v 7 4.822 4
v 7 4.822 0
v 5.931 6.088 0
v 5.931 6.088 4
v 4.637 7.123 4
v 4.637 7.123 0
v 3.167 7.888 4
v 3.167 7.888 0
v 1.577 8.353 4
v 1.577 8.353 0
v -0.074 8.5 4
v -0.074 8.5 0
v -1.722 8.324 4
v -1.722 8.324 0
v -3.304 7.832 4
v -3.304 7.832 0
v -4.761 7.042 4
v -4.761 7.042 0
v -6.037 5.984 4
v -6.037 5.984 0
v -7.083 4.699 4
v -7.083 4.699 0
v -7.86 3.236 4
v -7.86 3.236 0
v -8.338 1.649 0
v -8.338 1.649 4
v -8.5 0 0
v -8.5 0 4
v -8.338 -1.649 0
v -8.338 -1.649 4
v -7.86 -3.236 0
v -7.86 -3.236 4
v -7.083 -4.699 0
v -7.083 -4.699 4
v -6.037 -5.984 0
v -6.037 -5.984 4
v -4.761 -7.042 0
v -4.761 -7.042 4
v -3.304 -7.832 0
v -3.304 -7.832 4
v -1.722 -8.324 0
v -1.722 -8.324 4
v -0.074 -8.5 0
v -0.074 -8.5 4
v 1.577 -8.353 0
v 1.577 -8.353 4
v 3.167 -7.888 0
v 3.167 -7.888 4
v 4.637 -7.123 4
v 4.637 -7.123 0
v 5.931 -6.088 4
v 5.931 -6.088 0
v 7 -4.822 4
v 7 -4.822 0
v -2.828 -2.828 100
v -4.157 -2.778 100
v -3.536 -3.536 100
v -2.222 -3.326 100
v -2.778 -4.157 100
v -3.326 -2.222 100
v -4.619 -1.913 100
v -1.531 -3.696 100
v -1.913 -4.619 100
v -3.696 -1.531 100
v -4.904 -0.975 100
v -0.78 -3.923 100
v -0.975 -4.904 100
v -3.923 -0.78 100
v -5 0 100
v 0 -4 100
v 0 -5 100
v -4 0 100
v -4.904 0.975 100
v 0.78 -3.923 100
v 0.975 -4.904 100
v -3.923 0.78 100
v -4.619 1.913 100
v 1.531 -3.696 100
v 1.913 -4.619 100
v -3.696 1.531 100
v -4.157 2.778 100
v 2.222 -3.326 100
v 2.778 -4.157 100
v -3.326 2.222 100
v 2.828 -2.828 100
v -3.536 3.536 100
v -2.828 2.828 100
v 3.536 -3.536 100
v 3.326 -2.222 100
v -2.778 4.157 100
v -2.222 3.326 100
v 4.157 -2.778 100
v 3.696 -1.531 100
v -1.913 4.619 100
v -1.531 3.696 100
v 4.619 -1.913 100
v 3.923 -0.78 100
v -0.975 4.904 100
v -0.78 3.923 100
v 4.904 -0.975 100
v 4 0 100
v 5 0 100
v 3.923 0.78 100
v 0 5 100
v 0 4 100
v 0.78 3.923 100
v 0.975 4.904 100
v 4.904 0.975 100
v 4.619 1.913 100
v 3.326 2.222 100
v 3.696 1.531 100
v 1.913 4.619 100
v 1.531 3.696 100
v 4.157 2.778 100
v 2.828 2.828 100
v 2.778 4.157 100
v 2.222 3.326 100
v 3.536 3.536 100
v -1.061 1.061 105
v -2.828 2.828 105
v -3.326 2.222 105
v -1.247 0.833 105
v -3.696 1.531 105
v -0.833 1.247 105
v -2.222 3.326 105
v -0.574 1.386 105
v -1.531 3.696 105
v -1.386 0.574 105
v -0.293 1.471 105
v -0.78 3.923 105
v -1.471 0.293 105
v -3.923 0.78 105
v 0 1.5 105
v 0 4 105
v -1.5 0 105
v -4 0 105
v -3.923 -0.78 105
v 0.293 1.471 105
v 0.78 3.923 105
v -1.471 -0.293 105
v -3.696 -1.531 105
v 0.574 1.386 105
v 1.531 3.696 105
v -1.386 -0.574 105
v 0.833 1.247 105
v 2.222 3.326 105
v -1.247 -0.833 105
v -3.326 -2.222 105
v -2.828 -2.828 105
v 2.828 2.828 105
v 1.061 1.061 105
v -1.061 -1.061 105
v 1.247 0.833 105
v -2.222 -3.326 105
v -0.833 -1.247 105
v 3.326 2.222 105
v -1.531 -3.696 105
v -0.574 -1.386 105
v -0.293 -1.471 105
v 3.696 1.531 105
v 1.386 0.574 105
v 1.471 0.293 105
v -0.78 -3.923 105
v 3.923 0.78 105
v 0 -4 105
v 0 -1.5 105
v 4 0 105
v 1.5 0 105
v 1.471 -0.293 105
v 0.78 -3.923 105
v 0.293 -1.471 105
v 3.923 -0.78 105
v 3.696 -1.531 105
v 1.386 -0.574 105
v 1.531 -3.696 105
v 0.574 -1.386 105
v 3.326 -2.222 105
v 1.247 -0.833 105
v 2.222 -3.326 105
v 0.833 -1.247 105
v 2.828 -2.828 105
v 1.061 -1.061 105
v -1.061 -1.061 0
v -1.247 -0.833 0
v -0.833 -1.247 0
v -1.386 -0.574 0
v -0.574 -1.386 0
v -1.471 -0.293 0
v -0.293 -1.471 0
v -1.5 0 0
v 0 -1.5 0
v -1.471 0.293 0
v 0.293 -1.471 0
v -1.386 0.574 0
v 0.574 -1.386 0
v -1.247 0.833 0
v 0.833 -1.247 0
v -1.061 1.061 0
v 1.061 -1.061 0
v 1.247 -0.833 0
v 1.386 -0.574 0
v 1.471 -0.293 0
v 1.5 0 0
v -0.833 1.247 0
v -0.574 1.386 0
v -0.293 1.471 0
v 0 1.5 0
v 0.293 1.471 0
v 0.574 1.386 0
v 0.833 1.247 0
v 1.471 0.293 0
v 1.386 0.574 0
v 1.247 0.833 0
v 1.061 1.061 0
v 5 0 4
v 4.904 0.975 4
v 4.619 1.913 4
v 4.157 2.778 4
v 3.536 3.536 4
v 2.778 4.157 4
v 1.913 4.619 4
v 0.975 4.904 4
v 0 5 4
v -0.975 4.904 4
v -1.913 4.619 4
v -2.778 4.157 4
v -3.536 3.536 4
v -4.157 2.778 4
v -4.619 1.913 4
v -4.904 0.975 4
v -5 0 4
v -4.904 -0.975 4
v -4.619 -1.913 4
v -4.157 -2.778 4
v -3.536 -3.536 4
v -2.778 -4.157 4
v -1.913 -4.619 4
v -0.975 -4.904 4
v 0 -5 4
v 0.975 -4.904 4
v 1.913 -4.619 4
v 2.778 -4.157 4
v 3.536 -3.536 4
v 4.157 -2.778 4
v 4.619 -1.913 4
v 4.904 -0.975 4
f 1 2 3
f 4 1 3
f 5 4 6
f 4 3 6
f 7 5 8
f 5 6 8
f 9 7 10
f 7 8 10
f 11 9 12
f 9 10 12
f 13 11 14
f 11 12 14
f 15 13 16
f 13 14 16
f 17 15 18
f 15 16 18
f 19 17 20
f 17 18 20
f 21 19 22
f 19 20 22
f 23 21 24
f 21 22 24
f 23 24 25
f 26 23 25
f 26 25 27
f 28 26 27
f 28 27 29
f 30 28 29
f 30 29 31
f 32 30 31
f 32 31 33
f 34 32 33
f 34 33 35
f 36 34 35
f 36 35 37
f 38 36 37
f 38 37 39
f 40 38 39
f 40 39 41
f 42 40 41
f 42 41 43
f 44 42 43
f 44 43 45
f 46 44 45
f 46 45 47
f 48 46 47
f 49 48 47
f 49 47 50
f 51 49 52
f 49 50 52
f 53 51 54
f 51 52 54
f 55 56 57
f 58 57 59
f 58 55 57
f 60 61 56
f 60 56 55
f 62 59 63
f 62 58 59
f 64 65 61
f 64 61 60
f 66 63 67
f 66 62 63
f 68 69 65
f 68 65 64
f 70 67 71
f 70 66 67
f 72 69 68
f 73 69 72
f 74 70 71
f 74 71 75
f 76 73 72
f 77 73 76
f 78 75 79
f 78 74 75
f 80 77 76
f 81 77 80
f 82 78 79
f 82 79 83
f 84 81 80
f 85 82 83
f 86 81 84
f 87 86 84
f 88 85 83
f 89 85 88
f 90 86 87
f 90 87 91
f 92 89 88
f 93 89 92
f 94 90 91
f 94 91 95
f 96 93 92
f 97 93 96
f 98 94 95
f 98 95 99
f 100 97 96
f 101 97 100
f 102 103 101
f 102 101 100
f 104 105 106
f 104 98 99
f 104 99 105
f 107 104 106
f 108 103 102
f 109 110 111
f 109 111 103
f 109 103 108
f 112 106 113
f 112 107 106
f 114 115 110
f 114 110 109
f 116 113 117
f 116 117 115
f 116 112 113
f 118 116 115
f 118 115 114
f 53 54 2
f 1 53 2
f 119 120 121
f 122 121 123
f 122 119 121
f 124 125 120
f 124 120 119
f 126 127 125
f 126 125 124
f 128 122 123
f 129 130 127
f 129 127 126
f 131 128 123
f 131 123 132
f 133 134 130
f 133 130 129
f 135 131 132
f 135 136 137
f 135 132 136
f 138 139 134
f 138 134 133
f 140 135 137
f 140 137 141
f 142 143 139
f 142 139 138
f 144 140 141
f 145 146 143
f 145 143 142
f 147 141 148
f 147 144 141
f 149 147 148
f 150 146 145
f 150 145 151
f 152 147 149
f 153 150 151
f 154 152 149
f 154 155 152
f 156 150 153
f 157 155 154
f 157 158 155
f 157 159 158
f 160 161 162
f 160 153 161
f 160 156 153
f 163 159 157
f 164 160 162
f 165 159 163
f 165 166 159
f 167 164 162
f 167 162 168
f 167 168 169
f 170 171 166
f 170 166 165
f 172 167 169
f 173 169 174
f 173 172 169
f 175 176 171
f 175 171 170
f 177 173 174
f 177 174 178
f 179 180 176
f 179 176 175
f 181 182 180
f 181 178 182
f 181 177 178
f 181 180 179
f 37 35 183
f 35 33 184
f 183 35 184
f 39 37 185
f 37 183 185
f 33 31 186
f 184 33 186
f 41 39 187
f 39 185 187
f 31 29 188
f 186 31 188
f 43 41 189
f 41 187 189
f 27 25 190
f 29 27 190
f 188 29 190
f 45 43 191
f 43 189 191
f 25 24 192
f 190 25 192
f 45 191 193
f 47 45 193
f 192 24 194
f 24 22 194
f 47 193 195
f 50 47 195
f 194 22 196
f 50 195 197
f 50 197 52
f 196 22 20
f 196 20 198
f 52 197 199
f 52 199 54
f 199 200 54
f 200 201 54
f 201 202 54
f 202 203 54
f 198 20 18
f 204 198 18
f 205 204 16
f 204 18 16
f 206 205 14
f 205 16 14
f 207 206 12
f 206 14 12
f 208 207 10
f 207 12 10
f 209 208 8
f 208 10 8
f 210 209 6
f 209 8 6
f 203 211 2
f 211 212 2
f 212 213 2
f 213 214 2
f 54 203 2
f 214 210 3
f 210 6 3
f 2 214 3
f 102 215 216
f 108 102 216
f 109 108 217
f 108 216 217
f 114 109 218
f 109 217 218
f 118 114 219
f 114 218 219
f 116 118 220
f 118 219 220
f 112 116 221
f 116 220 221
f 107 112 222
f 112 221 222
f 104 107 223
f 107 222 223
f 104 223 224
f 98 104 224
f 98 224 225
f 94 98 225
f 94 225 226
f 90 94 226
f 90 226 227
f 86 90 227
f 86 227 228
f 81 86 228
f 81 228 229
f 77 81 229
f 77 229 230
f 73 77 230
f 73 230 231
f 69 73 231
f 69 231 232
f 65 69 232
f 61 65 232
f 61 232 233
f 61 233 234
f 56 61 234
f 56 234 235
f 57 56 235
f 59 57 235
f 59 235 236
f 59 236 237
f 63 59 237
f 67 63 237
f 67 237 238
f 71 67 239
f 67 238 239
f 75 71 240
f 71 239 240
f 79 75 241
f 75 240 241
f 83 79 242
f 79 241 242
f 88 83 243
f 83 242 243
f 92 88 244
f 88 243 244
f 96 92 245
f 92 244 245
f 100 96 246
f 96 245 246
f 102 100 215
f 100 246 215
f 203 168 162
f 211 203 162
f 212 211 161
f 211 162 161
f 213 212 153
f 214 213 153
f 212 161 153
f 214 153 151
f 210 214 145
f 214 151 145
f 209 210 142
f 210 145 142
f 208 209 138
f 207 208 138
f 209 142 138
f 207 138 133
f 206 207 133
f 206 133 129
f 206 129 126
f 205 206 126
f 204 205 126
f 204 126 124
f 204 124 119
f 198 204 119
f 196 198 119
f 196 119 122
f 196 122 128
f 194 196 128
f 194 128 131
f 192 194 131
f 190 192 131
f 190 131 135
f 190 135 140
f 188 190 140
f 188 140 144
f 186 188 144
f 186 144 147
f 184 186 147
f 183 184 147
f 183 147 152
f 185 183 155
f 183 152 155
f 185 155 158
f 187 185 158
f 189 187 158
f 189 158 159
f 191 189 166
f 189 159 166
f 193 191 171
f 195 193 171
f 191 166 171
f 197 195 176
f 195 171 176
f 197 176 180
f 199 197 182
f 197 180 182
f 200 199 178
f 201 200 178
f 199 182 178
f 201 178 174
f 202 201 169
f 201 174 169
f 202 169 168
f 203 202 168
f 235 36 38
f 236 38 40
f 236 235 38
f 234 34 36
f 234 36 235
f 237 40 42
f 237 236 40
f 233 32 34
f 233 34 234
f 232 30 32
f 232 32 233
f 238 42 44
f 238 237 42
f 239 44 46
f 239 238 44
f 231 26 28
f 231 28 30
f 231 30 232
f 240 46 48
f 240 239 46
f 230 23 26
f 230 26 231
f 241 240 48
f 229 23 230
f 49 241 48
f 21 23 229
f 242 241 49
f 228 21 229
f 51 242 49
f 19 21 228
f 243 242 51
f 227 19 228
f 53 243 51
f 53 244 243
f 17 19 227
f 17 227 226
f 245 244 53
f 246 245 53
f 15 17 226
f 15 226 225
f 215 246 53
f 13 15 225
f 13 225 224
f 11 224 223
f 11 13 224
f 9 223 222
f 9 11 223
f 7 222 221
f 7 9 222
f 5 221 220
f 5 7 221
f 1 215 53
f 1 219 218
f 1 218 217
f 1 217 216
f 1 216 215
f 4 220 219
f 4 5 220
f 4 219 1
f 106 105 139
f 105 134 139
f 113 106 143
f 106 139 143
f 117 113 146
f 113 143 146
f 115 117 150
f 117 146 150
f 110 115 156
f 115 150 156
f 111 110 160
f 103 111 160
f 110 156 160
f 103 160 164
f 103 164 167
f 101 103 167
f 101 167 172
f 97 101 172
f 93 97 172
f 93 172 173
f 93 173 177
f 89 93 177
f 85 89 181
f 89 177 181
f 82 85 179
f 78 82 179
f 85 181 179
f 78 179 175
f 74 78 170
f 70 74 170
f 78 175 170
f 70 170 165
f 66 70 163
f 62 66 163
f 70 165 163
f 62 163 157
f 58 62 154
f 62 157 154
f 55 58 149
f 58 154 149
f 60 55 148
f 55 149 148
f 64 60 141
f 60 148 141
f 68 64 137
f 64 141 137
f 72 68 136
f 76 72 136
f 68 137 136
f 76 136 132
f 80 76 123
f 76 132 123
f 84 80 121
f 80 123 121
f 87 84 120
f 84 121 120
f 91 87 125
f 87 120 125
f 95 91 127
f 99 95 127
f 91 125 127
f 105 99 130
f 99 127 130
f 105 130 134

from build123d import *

# Parameters (mm, degrees)
F0_R     = 8.5
F1_DEPTH = 4
F2_R     = 5
F3_DEPTH = 100
F4_W     = 4
F4_H     = 5
F7_DEPTH = 4
F8_R     = 1.5
F9_DEPTH = 114.9


with BuildPart() as f1:
    # F0 (on Top) → F1 (new body)
    with BuildSketch(Plane.XY):
        Circle(F0_R)
    extrude(amount=F1_DEPTH)

    # F2 (on Top) → F3 (join)
    with BuildSketch(Plane.XY):
        Circle(F2_R)
    extrude(amount=F3_DEPTH)

    # F4 (on Right) → F5 (revolve)
    with BuildSketch(Plane.YZ):
        with Locations((2, 102.5)):
            Rectangle(F4_W, F4_H)
    revolve(axis=Axis((0, 0, 102.5), (0, 0, -1)))

    # F6 (on face) → F7 (cut)
    with BuildSketch(Plane(origin=(0, 0, 0), x_dir=(1, 0, 0), z_dir=(0, 0, -1))):
        with BuildLine():
            ThreePointArc((7, -4.821825), (8.5, 0), (7, 4.821825))
            Line((7, 4.821825), (7, -4.821825))
        make_face()
    extrude(amount=-F7_DEPTH, mode=Mode.SUBTRACT)

    # F8 (on face) → F9 (cut)
    with BuildSketch(Plane.XY.offset(105)):
        Circle(F8_R)
    extrude(amount=-F9_DEPTH, mode=Mode.SUBTRACT)


solid = f1.part
